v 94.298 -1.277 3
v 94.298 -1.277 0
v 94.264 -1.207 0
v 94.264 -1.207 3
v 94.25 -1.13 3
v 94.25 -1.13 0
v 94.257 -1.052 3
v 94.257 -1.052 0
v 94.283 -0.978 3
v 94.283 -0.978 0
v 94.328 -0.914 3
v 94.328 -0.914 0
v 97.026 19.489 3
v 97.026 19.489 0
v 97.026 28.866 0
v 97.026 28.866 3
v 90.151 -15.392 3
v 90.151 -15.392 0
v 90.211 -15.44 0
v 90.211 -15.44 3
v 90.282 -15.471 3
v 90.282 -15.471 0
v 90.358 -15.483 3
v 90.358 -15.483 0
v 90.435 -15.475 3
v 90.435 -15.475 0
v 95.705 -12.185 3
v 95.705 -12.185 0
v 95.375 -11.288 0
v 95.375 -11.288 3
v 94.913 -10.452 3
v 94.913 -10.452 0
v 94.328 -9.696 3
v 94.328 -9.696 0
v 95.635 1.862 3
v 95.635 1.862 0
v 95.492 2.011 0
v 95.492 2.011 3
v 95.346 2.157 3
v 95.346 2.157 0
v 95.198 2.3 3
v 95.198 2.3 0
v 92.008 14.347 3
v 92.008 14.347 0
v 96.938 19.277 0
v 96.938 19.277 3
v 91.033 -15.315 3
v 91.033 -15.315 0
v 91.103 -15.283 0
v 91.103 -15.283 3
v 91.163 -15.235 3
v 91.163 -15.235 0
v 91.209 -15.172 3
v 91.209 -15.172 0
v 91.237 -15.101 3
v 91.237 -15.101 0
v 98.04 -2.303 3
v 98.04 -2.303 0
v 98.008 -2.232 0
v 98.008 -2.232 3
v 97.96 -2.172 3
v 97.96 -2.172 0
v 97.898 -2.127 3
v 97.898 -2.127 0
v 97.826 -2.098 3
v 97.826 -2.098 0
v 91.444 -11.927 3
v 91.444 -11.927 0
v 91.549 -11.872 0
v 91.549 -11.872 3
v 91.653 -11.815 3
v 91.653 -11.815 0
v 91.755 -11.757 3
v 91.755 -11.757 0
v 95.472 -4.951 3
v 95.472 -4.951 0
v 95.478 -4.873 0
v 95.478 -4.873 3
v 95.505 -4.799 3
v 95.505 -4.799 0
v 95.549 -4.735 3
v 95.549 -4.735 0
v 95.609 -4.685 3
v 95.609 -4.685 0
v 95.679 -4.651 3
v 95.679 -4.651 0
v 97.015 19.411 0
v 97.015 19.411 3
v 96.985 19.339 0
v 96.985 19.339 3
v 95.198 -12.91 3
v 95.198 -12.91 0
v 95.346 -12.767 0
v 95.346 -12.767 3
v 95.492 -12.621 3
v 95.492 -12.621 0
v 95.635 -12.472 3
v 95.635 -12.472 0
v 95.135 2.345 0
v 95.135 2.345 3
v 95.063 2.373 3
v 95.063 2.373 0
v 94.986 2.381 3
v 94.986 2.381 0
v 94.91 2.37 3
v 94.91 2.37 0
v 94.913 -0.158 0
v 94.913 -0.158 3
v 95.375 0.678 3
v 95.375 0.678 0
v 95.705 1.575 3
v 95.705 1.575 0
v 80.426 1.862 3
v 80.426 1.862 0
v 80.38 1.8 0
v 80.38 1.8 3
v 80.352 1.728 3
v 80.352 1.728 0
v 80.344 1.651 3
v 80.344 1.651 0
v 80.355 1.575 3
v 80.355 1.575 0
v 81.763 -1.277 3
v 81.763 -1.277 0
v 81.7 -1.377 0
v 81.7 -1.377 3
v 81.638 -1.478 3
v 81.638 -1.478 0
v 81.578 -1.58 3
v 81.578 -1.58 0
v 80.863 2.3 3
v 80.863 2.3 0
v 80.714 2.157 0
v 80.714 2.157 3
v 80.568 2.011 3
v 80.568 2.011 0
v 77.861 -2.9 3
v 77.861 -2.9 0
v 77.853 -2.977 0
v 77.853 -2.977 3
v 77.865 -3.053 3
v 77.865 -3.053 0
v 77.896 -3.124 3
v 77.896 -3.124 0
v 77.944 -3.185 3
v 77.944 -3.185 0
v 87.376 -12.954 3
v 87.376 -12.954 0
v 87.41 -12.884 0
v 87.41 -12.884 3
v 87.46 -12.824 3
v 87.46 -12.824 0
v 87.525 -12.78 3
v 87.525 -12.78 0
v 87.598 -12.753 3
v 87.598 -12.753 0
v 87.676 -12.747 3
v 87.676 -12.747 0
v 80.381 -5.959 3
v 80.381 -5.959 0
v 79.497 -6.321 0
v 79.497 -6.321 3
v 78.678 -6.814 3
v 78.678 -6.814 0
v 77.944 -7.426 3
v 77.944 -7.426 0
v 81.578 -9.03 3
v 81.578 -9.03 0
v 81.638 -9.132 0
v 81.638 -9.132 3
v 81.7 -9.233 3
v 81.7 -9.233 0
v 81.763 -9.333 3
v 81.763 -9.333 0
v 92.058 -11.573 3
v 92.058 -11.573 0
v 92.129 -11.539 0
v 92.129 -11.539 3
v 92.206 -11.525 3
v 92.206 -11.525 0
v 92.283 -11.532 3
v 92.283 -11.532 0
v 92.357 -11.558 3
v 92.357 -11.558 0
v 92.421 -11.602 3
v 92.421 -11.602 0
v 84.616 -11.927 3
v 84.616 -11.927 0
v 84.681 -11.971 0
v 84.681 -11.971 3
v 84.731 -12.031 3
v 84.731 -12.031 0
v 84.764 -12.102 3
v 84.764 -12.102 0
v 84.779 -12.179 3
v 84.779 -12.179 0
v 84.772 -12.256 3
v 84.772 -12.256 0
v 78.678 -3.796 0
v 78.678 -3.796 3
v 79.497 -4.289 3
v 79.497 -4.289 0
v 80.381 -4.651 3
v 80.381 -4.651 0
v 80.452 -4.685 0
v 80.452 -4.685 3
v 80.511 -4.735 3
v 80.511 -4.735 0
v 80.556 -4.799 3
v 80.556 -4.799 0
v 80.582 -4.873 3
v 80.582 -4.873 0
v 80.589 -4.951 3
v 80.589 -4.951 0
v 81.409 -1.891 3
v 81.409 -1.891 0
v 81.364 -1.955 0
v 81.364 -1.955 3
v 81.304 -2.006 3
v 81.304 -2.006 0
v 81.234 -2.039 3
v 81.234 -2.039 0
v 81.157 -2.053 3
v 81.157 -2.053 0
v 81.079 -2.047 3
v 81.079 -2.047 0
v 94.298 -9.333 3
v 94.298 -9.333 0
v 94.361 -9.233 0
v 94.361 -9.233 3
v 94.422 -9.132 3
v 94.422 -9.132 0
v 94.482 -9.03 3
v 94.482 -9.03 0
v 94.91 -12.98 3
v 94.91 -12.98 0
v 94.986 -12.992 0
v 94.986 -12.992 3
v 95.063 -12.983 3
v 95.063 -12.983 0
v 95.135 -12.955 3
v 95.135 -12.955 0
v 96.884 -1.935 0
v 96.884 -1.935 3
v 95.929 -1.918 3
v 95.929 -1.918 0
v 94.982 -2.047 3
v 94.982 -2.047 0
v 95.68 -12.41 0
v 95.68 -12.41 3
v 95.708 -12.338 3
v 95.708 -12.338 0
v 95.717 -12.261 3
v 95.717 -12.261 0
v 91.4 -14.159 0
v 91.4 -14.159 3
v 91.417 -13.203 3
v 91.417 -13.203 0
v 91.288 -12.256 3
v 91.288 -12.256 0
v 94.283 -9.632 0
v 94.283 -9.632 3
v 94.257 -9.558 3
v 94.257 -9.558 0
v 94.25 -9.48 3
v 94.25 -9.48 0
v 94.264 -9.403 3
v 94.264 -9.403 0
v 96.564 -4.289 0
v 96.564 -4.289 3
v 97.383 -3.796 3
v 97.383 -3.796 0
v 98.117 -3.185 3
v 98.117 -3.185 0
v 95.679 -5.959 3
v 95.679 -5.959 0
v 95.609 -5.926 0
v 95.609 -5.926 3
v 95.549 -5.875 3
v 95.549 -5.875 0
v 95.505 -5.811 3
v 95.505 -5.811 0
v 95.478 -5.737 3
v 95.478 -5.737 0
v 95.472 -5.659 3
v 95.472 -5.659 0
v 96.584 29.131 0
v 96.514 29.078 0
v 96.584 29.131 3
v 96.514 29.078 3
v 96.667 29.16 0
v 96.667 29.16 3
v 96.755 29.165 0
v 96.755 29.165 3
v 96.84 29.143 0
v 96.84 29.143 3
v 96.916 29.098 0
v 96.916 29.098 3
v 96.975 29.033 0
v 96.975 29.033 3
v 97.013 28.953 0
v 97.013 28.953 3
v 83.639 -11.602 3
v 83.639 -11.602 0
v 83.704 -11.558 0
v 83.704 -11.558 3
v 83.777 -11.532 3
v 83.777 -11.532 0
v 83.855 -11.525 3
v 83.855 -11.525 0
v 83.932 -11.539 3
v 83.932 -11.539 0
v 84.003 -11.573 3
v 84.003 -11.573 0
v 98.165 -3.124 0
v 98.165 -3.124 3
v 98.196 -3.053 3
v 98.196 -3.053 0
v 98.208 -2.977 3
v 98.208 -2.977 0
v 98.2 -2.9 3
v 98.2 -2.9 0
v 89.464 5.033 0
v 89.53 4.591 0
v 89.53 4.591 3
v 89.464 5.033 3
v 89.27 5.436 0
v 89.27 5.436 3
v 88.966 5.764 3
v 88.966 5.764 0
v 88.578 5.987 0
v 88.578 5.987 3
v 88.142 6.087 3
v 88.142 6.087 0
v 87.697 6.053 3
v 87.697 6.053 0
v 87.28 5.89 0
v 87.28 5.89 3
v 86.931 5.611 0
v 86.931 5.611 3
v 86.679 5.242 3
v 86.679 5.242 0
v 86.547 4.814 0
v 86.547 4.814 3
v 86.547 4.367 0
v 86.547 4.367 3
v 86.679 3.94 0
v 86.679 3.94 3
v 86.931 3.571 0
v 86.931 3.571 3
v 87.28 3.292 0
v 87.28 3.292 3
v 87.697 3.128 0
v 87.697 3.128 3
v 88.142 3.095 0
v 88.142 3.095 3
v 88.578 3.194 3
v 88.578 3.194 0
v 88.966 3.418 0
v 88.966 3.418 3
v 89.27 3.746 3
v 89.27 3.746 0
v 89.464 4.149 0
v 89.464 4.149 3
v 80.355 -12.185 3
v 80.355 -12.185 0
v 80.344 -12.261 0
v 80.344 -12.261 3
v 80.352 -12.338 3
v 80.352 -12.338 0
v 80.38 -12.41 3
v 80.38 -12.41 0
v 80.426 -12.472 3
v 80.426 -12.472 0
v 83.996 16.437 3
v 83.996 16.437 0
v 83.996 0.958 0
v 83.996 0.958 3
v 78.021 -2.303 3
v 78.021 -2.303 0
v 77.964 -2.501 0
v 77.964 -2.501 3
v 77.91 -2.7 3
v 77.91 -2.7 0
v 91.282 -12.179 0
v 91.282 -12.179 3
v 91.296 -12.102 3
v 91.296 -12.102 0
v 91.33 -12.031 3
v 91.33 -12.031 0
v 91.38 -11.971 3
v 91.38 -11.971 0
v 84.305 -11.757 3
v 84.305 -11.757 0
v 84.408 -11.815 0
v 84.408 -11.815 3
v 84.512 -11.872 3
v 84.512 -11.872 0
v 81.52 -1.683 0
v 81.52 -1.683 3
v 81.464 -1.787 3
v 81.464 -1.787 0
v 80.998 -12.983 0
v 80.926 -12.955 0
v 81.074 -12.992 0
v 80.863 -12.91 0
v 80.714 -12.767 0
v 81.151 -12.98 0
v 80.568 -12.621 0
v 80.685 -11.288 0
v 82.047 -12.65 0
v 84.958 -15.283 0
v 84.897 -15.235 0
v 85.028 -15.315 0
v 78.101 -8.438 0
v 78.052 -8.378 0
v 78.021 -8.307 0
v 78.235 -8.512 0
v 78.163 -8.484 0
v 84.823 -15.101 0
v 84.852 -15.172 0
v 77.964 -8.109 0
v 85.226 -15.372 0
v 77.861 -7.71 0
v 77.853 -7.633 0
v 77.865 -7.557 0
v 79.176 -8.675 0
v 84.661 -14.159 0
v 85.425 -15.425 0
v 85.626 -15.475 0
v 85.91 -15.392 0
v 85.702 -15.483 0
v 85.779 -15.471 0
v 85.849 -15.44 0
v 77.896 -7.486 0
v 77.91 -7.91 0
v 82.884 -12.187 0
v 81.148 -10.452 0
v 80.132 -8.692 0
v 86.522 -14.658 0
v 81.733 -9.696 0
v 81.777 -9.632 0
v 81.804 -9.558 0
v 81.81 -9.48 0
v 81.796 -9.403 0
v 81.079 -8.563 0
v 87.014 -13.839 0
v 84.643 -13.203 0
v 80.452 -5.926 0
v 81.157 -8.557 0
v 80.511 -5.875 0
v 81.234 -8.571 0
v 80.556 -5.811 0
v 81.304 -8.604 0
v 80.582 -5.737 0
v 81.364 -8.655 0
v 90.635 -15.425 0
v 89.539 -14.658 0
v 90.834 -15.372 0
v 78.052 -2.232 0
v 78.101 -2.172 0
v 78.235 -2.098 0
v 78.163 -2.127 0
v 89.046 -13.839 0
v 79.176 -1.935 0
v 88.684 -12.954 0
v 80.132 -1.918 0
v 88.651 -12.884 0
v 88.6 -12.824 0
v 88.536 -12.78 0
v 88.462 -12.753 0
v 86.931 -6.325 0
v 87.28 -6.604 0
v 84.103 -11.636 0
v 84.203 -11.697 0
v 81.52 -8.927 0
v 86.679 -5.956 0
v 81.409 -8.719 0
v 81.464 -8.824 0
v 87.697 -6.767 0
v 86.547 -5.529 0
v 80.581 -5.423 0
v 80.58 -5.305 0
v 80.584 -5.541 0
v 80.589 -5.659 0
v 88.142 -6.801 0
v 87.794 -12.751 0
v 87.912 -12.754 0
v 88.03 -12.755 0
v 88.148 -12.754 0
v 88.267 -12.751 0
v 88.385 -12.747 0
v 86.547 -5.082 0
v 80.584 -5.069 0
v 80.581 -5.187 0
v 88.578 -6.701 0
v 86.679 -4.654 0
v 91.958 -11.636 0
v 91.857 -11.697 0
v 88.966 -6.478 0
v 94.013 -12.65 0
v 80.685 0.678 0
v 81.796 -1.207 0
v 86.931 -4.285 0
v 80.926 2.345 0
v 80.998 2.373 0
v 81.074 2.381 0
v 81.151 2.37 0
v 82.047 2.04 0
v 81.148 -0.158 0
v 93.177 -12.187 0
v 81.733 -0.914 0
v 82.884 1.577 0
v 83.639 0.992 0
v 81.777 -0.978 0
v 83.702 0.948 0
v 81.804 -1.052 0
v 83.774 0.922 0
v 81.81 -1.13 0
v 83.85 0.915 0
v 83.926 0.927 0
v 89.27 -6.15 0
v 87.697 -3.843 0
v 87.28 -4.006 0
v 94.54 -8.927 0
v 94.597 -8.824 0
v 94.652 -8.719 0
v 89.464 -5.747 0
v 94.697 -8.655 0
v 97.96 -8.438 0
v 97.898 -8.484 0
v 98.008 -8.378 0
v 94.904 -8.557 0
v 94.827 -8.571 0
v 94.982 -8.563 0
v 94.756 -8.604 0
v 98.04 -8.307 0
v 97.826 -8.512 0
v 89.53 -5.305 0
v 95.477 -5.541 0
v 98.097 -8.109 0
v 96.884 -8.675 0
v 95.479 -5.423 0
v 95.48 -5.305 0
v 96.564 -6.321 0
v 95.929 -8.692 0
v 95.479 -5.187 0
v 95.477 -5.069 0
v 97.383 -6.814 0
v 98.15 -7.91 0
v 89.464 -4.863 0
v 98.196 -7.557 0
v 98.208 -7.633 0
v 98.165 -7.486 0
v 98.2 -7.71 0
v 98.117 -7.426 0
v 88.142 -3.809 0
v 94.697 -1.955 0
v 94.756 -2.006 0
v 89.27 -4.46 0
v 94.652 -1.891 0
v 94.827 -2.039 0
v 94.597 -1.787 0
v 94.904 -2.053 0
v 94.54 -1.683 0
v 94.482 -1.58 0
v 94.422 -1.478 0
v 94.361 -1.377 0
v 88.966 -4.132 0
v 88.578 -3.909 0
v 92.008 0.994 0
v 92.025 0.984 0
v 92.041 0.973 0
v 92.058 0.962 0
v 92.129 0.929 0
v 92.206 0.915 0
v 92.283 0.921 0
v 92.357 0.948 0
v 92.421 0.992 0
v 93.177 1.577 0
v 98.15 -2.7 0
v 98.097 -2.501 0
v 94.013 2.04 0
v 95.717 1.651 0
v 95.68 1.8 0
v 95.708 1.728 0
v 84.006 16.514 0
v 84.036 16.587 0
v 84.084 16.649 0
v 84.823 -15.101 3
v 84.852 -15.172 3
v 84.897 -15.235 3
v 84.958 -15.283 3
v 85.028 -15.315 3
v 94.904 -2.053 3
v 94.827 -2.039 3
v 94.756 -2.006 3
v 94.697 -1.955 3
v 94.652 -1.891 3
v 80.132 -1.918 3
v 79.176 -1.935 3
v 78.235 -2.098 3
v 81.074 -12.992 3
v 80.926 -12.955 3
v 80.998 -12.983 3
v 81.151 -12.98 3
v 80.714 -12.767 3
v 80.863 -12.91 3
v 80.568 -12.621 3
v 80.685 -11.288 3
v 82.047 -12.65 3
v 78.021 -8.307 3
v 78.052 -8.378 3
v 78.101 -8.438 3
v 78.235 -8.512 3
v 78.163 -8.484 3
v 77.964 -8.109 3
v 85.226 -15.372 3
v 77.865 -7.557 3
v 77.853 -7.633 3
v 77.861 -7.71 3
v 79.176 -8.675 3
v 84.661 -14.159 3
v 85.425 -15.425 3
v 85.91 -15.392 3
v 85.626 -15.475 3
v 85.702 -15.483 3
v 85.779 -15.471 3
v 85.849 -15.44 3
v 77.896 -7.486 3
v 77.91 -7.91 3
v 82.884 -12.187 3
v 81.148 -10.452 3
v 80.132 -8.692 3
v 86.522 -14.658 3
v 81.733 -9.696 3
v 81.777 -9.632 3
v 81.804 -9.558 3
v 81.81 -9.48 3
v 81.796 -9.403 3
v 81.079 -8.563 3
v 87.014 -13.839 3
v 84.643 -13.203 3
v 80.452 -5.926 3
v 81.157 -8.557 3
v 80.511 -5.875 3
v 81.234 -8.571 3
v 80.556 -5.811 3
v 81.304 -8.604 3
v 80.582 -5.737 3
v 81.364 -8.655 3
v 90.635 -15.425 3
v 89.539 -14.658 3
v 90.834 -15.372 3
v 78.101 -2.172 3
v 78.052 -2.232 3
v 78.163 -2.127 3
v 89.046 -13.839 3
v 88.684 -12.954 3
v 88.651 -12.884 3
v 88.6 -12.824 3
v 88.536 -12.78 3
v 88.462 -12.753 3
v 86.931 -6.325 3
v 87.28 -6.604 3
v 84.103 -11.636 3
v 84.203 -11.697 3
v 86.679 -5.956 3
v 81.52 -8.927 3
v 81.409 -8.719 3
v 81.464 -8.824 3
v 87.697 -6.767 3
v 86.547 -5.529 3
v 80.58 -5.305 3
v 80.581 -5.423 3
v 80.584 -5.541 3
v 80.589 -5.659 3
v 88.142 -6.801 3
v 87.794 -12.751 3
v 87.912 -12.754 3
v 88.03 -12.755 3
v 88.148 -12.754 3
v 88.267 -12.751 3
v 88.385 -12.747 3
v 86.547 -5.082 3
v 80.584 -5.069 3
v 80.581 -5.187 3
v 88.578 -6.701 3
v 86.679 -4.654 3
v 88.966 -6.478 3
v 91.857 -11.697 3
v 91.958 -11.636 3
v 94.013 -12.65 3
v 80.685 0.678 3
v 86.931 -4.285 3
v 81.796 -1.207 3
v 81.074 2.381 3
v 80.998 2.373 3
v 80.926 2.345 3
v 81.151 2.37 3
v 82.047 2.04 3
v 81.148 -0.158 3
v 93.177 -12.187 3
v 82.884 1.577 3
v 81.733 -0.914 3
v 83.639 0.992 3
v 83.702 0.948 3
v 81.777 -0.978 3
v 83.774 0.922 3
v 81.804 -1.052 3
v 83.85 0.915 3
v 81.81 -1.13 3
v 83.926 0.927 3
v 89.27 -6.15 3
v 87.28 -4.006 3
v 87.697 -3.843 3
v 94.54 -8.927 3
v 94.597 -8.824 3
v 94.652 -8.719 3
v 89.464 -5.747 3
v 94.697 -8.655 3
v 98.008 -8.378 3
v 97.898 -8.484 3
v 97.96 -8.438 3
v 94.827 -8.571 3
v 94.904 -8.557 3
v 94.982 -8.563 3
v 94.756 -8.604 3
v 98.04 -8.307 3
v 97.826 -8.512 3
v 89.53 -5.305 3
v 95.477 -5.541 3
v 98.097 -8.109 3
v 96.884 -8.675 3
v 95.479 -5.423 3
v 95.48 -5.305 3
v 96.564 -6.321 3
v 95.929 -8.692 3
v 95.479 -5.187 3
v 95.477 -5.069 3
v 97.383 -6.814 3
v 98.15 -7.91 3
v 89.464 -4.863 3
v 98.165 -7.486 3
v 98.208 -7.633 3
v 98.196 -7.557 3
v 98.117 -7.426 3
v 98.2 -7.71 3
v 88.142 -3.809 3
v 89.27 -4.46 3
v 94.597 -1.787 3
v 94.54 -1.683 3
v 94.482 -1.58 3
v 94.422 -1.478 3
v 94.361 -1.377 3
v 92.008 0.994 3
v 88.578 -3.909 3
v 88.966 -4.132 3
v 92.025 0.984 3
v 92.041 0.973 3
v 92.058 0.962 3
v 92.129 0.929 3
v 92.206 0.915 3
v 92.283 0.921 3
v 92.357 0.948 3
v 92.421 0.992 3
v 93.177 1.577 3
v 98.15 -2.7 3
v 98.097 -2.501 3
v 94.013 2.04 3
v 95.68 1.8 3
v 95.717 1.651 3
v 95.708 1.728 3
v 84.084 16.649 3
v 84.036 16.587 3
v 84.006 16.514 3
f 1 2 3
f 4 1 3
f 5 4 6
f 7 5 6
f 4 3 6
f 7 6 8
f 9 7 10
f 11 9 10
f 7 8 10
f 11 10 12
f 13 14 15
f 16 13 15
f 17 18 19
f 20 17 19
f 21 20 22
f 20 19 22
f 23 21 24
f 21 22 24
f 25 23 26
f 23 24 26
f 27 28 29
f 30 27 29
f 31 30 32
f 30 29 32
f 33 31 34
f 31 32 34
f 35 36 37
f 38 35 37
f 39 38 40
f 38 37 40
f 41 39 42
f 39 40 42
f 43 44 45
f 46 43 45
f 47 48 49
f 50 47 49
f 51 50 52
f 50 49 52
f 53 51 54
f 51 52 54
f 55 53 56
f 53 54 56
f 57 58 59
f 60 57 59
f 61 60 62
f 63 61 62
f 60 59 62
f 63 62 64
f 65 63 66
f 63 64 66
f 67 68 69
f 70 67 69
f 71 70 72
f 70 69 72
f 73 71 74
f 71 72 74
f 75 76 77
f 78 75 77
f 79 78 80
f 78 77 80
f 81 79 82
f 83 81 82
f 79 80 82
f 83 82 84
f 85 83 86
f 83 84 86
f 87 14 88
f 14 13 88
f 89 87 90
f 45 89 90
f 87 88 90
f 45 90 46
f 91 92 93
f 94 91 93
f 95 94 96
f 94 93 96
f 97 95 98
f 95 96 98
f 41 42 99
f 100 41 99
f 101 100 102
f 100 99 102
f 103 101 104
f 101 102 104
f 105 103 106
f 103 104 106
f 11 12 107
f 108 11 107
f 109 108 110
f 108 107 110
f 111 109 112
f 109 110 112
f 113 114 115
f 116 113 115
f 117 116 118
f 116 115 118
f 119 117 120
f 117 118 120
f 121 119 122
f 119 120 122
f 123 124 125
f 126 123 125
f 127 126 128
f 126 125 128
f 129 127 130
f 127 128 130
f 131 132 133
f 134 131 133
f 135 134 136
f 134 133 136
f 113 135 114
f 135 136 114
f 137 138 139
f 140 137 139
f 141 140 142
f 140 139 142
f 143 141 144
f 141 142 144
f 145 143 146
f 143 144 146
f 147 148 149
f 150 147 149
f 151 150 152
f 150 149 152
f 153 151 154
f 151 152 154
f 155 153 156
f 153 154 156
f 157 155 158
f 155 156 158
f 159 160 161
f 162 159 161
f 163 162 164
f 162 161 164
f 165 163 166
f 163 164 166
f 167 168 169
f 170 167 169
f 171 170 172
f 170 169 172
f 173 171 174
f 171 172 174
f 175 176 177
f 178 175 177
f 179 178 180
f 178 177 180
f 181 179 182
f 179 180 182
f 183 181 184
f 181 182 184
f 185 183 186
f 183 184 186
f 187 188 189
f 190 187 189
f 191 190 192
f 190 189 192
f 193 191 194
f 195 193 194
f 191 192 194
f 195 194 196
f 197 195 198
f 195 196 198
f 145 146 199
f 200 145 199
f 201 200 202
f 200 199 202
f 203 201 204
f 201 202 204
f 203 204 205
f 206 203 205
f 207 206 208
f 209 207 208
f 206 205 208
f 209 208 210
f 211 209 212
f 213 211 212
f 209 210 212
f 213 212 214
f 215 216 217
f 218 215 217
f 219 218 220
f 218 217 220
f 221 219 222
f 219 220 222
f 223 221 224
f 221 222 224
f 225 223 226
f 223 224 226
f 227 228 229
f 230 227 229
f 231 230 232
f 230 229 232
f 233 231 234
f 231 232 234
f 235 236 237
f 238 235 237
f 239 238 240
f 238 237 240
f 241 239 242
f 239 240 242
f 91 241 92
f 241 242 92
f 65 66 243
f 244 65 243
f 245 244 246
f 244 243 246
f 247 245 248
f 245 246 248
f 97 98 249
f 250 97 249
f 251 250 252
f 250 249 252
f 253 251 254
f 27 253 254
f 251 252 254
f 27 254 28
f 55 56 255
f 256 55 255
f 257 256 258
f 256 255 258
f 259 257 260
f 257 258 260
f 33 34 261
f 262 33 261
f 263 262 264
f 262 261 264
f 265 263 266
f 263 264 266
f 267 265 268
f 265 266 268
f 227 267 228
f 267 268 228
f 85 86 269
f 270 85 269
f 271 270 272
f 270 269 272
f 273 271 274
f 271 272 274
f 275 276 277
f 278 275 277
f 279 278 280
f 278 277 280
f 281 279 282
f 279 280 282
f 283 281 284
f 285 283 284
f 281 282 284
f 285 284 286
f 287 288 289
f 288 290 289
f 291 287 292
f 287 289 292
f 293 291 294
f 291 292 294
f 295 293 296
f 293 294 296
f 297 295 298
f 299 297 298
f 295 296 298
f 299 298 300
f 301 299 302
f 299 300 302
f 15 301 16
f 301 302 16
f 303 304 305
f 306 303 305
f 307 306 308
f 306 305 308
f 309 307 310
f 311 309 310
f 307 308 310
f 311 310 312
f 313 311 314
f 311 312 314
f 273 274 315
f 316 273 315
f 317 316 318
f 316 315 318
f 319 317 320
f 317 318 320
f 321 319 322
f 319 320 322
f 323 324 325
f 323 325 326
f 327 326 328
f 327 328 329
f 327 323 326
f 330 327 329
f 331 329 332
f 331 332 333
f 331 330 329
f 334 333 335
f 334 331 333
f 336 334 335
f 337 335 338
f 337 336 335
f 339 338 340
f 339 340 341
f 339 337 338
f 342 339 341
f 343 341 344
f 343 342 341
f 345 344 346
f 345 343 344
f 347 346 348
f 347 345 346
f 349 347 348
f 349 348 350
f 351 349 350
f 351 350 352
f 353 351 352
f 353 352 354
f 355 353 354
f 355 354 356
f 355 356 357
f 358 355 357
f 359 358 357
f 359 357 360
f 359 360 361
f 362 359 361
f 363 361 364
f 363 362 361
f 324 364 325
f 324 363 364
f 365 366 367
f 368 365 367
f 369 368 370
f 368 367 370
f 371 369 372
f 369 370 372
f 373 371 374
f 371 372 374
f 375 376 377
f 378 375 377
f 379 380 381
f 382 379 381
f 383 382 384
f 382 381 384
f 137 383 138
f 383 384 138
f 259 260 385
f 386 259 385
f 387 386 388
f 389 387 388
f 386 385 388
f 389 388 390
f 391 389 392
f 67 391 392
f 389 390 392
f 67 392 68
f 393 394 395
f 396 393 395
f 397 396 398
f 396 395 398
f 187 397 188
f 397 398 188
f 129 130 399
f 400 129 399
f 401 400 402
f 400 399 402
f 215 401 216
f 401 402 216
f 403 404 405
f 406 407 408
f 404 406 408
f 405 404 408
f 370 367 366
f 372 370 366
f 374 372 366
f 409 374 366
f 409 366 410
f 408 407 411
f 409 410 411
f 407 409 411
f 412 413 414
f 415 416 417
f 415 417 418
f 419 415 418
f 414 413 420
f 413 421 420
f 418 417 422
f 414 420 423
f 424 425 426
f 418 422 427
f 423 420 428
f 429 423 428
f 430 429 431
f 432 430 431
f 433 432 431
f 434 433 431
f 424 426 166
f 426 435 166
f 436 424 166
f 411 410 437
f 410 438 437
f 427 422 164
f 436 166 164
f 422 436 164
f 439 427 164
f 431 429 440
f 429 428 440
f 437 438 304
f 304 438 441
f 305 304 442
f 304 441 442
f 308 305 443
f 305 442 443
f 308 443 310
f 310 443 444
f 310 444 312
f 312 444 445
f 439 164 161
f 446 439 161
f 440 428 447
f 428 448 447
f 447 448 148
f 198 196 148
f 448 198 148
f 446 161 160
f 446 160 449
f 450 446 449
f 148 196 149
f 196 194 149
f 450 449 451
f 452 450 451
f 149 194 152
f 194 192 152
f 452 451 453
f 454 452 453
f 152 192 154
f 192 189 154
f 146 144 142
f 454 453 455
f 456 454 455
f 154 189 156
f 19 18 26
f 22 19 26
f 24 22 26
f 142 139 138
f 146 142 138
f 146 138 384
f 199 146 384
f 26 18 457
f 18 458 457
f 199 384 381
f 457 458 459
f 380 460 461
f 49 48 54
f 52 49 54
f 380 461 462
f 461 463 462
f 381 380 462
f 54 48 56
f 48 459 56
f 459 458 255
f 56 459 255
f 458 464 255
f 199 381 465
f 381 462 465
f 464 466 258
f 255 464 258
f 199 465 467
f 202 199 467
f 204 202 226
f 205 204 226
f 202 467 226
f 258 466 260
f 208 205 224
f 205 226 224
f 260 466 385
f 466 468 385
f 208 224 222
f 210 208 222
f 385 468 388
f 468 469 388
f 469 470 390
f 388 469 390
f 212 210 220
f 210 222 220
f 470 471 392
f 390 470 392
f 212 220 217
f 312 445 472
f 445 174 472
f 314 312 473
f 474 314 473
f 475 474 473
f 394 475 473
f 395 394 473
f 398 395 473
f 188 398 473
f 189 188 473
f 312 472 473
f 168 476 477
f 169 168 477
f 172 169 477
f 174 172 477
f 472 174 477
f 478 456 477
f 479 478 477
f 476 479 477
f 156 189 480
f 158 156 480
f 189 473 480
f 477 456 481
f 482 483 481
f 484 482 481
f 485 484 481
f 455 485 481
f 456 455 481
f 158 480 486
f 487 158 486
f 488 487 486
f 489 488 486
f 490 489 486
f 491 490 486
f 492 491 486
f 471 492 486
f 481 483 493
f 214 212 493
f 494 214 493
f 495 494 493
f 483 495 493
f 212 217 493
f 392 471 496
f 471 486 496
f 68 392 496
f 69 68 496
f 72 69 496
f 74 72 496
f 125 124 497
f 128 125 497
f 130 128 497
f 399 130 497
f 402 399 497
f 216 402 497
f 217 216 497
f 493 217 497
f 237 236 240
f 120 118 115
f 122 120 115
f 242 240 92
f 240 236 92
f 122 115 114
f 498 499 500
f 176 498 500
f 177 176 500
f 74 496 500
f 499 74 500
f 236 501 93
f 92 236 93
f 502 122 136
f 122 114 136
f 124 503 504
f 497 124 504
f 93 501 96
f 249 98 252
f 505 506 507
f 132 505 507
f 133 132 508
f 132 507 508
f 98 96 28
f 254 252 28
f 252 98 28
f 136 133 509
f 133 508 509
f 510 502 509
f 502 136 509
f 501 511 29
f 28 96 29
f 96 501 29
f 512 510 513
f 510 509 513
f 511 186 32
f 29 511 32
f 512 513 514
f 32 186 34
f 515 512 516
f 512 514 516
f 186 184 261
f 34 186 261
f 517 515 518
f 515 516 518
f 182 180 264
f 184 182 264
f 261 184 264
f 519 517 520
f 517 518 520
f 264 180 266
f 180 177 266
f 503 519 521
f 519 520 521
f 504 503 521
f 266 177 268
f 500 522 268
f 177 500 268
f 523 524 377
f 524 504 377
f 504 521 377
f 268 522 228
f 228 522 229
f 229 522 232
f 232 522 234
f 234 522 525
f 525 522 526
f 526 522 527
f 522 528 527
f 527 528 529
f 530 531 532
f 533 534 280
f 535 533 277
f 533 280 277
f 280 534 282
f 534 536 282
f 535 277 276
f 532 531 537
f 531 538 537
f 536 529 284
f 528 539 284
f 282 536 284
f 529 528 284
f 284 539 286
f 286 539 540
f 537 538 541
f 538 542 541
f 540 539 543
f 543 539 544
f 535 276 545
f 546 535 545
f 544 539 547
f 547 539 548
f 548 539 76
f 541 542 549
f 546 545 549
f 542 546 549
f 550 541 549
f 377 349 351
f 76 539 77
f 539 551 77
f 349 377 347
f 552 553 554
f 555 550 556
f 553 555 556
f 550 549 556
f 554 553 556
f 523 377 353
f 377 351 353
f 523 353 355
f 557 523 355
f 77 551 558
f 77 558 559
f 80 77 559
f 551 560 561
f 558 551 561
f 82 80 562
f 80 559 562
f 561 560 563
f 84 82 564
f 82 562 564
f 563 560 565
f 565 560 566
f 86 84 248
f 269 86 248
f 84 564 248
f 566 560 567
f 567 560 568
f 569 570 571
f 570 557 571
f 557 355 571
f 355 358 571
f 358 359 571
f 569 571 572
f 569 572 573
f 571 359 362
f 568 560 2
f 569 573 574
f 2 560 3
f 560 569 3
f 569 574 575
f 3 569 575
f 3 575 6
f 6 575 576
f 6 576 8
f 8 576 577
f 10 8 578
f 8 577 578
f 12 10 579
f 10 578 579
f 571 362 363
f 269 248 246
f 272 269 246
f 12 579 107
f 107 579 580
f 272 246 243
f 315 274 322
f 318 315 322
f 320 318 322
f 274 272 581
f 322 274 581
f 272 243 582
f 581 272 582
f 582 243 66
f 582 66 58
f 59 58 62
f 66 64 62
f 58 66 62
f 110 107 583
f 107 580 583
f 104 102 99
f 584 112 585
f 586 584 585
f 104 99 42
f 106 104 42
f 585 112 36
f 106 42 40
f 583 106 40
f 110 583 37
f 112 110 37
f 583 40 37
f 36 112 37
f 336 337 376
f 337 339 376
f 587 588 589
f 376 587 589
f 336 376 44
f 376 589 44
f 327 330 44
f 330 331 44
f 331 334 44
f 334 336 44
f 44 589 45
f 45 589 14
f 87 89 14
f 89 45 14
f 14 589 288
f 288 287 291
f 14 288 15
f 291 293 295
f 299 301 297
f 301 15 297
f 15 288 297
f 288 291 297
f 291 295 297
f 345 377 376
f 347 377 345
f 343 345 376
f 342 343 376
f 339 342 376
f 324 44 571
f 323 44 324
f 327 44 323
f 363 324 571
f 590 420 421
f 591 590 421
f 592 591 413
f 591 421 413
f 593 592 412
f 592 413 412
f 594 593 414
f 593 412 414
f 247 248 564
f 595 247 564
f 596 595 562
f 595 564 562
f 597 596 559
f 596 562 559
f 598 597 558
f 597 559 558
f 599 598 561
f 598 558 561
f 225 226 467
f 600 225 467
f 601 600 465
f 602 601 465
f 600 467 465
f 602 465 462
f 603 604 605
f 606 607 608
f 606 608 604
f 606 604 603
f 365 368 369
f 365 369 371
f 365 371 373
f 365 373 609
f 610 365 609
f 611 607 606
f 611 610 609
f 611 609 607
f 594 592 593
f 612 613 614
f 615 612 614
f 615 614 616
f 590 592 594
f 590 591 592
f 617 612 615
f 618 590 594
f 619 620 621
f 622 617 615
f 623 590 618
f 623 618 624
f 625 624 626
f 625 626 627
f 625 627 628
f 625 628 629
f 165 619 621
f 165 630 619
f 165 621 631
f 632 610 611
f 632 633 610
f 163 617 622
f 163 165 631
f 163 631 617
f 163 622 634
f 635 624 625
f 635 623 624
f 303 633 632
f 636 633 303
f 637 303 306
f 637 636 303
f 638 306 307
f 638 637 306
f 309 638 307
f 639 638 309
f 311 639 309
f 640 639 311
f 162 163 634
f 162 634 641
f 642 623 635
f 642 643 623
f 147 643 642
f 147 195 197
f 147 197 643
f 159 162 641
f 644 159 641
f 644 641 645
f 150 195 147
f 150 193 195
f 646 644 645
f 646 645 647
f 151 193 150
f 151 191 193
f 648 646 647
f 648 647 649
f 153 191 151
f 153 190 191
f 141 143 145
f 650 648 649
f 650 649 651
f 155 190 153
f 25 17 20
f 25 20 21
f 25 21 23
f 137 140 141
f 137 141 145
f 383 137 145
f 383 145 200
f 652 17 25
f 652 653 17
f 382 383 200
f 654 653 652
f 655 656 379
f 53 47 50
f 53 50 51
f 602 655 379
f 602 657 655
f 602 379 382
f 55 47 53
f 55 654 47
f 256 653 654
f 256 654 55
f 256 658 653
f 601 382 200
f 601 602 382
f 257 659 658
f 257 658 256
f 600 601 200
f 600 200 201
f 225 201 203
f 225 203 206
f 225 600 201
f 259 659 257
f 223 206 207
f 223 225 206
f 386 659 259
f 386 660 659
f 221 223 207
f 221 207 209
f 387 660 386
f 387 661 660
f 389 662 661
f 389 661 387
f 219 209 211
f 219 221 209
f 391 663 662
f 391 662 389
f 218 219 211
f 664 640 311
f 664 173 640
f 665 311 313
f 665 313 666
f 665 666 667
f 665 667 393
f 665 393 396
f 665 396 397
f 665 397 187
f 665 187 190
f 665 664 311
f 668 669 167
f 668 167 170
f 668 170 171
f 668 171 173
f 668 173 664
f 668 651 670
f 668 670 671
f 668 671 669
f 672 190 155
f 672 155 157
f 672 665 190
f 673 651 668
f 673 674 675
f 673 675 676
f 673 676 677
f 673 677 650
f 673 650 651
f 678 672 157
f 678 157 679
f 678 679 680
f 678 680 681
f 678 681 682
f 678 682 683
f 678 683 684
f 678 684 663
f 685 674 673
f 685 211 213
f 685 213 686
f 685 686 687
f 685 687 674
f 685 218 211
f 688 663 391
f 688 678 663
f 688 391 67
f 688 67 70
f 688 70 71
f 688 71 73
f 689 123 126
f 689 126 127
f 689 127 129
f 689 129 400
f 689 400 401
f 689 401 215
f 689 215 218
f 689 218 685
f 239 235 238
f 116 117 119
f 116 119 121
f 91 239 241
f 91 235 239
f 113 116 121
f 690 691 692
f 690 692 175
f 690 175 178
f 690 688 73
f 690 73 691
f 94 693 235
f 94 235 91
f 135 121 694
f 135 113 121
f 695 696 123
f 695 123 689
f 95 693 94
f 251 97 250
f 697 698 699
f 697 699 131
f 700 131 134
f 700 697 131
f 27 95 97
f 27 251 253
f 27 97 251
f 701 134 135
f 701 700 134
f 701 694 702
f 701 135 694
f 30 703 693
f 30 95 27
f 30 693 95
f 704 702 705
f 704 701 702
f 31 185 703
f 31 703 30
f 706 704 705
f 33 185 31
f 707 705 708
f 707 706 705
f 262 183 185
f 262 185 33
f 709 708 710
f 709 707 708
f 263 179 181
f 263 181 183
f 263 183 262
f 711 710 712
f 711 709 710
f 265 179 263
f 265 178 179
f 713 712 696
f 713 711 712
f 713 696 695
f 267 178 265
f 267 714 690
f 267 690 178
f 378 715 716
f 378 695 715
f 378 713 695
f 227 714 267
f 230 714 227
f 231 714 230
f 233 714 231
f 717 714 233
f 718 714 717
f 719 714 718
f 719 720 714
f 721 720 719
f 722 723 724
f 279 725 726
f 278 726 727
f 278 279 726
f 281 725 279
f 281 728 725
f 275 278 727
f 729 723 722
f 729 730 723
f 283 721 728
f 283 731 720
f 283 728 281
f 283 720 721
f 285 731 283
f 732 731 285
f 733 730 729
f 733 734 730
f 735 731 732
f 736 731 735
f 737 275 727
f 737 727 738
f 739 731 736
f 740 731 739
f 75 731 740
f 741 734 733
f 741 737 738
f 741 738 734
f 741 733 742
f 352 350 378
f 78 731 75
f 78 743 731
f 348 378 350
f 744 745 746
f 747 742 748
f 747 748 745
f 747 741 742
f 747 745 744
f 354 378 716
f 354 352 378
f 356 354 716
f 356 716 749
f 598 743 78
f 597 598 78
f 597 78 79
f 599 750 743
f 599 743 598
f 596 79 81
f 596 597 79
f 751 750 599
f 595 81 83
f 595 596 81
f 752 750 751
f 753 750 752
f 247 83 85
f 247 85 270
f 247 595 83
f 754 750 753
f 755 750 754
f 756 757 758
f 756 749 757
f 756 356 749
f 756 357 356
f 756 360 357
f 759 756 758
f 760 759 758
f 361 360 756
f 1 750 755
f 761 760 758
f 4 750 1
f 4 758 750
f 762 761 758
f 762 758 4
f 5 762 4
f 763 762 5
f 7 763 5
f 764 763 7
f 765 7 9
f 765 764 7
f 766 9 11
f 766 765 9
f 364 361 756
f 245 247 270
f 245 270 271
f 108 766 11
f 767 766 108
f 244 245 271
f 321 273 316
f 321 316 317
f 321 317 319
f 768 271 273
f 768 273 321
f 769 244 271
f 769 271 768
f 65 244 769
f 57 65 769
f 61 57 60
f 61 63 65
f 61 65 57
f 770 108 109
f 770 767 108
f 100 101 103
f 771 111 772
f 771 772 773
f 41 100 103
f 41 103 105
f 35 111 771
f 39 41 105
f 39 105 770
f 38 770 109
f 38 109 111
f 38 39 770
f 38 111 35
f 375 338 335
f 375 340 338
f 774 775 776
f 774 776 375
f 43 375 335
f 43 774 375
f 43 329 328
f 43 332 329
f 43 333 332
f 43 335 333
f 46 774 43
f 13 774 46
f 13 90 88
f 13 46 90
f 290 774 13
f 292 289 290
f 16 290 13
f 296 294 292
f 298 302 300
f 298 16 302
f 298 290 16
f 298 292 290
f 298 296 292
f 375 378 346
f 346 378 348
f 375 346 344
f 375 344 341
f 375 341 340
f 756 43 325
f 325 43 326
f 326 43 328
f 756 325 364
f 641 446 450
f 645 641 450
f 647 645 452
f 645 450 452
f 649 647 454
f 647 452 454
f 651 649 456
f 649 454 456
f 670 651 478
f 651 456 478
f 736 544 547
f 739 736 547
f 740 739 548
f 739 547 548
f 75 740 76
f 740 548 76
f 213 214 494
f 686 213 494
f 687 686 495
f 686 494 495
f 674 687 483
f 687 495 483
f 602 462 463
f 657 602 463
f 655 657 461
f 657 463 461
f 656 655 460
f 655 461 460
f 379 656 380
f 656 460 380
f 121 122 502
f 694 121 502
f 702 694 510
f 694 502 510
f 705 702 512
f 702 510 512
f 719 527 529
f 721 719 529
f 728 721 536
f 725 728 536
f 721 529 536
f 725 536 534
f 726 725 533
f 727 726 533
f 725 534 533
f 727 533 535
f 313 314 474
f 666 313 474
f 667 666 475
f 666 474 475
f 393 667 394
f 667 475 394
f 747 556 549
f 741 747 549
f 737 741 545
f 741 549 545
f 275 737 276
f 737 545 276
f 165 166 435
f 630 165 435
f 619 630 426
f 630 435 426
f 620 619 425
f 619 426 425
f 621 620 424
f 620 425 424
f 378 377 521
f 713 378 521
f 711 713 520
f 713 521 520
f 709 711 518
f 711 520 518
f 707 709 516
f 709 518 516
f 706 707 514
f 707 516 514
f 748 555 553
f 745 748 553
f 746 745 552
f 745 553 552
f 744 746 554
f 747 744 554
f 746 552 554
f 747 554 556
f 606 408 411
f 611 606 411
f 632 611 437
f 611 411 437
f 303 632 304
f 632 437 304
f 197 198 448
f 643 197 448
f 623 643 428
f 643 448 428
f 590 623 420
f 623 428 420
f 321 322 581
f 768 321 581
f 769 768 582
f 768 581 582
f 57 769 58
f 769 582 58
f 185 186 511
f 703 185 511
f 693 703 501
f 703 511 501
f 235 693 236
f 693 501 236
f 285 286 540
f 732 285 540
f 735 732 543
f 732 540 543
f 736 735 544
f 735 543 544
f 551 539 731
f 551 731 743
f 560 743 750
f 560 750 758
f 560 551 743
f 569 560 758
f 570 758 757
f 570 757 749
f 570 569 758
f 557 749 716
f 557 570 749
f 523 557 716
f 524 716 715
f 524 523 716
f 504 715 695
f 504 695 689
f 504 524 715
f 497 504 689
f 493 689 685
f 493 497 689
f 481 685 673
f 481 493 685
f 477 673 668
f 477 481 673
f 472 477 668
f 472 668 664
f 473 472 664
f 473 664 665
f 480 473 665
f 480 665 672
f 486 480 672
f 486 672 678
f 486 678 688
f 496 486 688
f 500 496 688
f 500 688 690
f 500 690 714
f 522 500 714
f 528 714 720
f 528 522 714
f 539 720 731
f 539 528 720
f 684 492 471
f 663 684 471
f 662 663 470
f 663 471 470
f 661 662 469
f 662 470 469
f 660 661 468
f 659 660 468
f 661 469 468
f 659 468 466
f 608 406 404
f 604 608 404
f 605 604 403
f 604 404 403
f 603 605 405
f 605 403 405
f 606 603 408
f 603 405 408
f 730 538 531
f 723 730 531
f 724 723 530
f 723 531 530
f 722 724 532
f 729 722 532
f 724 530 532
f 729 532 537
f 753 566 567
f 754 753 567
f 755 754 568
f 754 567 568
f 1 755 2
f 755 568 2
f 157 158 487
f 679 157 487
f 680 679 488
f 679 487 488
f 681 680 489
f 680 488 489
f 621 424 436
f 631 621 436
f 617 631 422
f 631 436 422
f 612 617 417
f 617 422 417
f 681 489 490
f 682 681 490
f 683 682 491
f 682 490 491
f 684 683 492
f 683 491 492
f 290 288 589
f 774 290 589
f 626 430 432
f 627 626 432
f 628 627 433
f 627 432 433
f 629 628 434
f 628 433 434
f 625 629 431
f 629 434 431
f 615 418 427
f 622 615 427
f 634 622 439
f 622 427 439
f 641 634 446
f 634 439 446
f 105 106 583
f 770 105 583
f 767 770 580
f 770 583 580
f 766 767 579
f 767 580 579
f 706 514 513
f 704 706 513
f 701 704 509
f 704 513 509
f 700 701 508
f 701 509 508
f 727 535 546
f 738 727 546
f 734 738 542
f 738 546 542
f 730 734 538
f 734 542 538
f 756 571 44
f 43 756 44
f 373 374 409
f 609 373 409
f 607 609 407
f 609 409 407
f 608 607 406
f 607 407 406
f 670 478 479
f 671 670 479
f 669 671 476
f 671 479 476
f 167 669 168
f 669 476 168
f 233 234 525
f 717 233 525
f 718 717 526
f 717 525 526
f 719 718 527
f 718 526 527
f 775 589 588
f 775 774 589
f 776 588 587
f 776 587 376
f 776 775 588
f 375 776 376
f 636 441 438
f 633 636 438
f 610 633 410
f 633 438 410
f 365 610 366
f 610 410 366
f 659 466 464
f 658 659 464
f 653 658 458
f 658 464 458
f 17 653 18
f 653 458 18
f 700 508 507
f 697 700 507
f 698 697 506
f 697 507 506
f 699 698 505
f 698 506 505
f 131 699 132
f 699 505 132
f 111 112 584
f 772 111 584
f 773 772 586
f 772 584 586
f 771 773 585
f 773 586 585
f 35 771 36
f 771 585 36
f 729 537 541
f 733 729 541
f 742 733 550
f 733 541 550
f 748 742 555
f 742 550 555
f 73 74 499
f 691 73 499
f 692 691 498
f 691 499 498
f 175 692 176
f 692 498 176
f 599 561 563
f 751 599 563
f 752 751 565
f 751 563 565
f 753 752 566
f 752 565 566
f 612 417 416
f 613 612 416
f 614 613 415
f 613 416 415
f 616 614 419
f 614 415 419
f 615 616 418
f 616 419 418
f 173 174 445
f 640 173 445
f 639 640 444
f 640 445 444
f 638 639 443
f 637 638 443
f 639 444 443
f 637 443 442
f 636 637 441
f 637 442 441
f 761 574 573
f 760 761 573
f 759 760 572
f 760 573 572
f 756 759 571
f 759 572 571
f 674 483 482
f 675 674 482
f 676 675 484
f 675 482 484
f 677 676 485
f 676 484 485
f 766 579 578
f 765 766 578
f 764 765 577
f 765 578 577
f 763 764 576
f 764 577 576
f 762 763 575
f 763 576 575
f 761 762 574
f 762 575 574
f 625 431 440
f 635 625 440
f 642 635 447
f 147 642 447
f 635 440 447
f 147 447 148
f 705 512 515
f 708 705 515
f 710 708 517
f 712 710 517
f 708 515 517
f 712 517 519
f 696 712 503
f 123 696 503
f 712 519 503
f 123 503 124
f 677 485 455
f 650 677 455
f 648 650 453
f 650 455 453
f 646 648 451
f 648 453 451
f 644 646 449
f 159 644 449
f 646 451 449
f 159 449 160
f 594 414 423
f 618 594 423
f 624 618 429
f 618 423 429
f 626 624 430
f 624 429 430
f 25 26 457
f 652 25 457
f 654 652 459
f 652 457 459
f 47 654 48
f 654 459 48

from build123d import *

# Parameters (mm, degrees)
ESQUISSE18_R        = 1.5
BOSS_EXTRU_18_DEPTH = 3
CONG_1_R            = 0.3


with BuildPart() as part:
    # Esquisse18 → Boss.-Extru.18 (new body)
    with BuildSketch(Plane.XY):
        with BuildLine():
            Line((97.025632531, 29.590316063), (83.99617235, 16.560855882))
            Line((83.99617235, 16.560855882), (83.99617235, 0.958265781))
            ThreePointArc((83.99617235, 0.958265781), (83.812104956, 0.91607214), (83.639294573, 0.992214643))
            ThreePointArc((83.639294573, 0.992214643), (82.474359337, 1.824587373), (81.150565301, 2.370011808))
            ThreePointArc((81.150565301, 2.370011808), (80.997528298, 2.372778276), (80.863045123, 2.29968756))
            ThreePointArc((80.863045123, 2.29968756), (80.641045132, 2.084165463), (80.425523035, 1.862165472))
            ThreePointArc((80.425523035, 1.862165472), (80.352432318, 1.727682296), (80.355198786, 1.574645294))
            ThreePointArc((80.355198786, 1.574645294), (80.900623221, 0.250851257), (81.732995951, -0.914083979))
            ThreePointArc((81.732995951, -0.914083979), (81.809478339, -1.090727988), (81.76286699, -1.277489987))
            ThreePointArc((81.76286699, -1.277489987), (81.668844739, -1.427698297), (81.578421737, -1.580100401))
            ThreePointArc((81.578421737, -1.580100401), (81.491649145, -1.734610069), (81.408576058, -1.891139882))
            ThreePointArc((81.408576058, -1.891139882), (81.270141097, -2.024887494), (81.078921703, -2.046973808))
            ThreePointArc((81.078921703, -2.046973808), (79.65387183, -1.908585496), (78.234720348, -2.098131098))
            ThreePointArc((78.234720348, -2.098131098), (78.100803182, -2.172253768), (78.020882694, -2.302793773))
            ThreePointArc((78.020882694, -2.302793773), (77.93638611, -2.600441379), (77.860738495, -2.90046006))
            ThreePointArc((77.860738495, -2.90046006), (77.864681666, -3.053471264), (77.943595998, -3.184621962))
            ThreePointArc((77.943595998, -3.184621962), (79.077844433, -4.058349009), (80.38116798, -4.651026153))
            ThreePointArc((80.38116798, -4.651026153), (80.535725676, -4.765763159), (80.588740063, -4.950809468))
            ThreePointArc((80.588740063, -4.950809468), (80.58241856, -5.127904807), (80.580310995, -5.305100401))
            ThreePointArc((80.580310995, -5.305100401), (80.58241856, -5.482295995), (80.588740063, -5.659391333))
            ThreePointArc((80.588740063, -5.659391333), (80.535725676, -5.844437642), (80.38116798, -5.959174648))
            ThreePointArc((80.38116798, -5.959174648), (79.077844433, -6.551851792), (77.943595998, -7.425578839))
            ThreePointArc((77.943595998, -7.425578839), (77.864681666, -7.556729537), (77.860738495, -7.709740741))
            ThreePointArc((77.860738495, -7.709740741), (77.93638611, -8.009759422), (78.020882694, -8.307407028))
            ThreePointArc((78.020882694, -8.307407028), (78.100803182, -8.437947034), (78.234720348, -8.512069703))
            ThreePointArc((78.234720348, -8.512069703), (79.65387183, -8.701615305), (81.078921703, -8.563226993))
            ThreePointArc((81.078921703, -8.563226993), (81.270141097, -8.585313307), (81.408576058, -8.719060919))
            ThreePointArc((81.408576058, -8.719060919), (81.491649145, -8.875590732), (81.578421737, -9.030100401))
            ThreePointArc((81.578421737, -9.030100401), (81.668844739, -9.182502504), (81.76286699, -9.332710814))
            ThreePointArc((81.76286699, -9.332710814), (81.809478339, -9.519472813), (81.732995951, -9.696116822))
            ThreePointArc((81.732995951, -9.696116822), (80.900623221, -10.861052059), (80.355198786, -12.184846095))
            ThreePointArc((80.355198786, -12.184846095), (80.352432318, -12.337883097), (80.425523035, -12.472366273))
            ThreePointArc((80.425523035, -12.472366273), (80.641045132, -12.694366264), (80.863045123, -12.909888361))
            ThreePointArc((80.863045123, -12.909888361), (80.997528298, -12.982979077), (81.150565301, -12.98021261))
            ThreePointArc((81.150565301, -12.98021261), (82.474359337, -12.434788174), (83.639294573, -11.602415444))
            ThreePointArc((83.639294573, -11.602415444), (83.815938583, -11.525933057), (84.002700581, -11.572544405))
            ThreePointArc((84.002700581, -11.572544405), (84.152908892, -11.666566657), (84.305310995, -11.756989659))
            ThreePointArc((84.305310995, -11.756989659), (84.459820663, -11.843762251), (84.616350477, -11.926835338))
            ThreePointArc((84.616350477, -11.926835338), (84.750098088, -12.065270299), (84.772184402, -12.256489692))
            ThreePointArc((84.772184402, -12.256489692), (84.633796091, -13.681539565), (84.823341693, -15.100691048))
            ThreePointArc((84.823341693, -15.100691048), (84.897464362, -15.234608214), (85.028004367, -15.314528702))
            ThreePointArc((85.028004367, -15.314528702), (85.325651974, -15.399025285), (85.625670654, -15.474672901))
            ThreePointArc((85.625670654, -15.474672901), (85.778681859, -15.47072973), (85.909832557, -15.391815398))
            ThreePointArc((85.909832557, -15.391815398), (86.783559604, -14.257566963), (87.376236747, -12.954243415))
            ThreePointArc((87.376236747, -12.954243415), (87.490973753, -12.79968572), (87.676020063, -12.746671333))
            ThreePointArc((87.676020063, -12.746671333), (87.853115401, -12.752992835), (88.030310995, -12.755100401))
            ThreePointArc((88.030310995, -12.755100401), (88.207506589, -12.752992835), (88.384601928, -12.746671333))
            ThreePointArc((88.384601928, -12.746671333), (88.569648237, -12.79968572), (88.684385243, -12.954243415))
            ThreePointArc((88.684385243, -12.954243415), (89.277062386, -14.257566963), (90.150789434, -15.391815398))
            ThreePointArc((90.150789434, -15.391815398), (90.281940131, -15.47072973), (90.434951336, -15.474672901))
            ThreePointArc((90.434951336, -15.474672901), (90.734970016, -15.399025285), (91.032617623, -15.314528702))
            ThreePointArc((91.032617623, -15.314528702), (91.163157628, -15.234608214), (91.237280298, -15.100691048))
            ThreePointArc((91.237280298, -15.100691048), (91.426825899, -13.681539565), (91.288437588, -12.256489692))
            ThreePointArc((91.288437588, -12.256489692), (91.310523902, -12.065270299), (91.444271513, -11.926835338))
            ThreePointArc((91.444271513, -11.926835338), (91.600801327, -11.843762251), (91.755310995, -11.756989659))
            ThreePointArc((91.755310995, -11.756989659), (91.907713098, -11.666566657), (92.057921409, -11.572544405))
            ThreePointArc((92.057921409, -11.572544405), (92.244683407, -11.525933057), (92.421327417, -11.602415444))
            ThreePointArc((92.421327417, -11.602415444), (93.586262653, -12.434788174), (94.91005669, -12.98021261))
            ThreePointArc((94.91005669, -12.98021261), (95.063093692, -12.982979077), (95.197576867, -12.909888361))
            ThreePointArc((95.197576867, -12.909888361), (95.419576859, -12.694366264), (95.635098955, -12.472366273))
            ThreePointArc((95.635098955, -12.472366273), (95.708189672, -12.337883097), (95.705423204, -12.184846095))
            ThreePointArc((95.705423204, -12.184846095), (95.159998769, -10.861052059), (94.327626039, -9.696116822))
            ThreePointArc((94.327626039, -9.696116822), (94.251143651, -9.519472813), (94.297755, -9.332710814))
            ThreePointArc((94.297755, -9.332710814), (94.391777251, -9.182502504), (94.482200253, -9.030100401))
            ThreePointArc((94.482200253, -9.030100401), (94.568972845, -8.875590732), (94.652045932, -8.719060919))
            ThreePointArc((94.652045932, -8.719060919), (94.790480893, -8.585313307), (94.981700287, -8.563226993))
            ThreePointArc((94.981700287, -8.563226993), (96.40675016, -8.701615305), (97.825901643, -8.512069703))
            ThreePointArc((97.825901643, -8.512069703), (97.959818808, -8.437947034), (98.039739296, -8.307407028))
            ThreePointArc((98.039739296, -8.307407028), (98.12423588, -8.009759422), (98.199883495, -7.709740741))
            ThreePointArc((98.199883495, -7.709740741), (98.195940325, -7.556729537), (98.117025992, -7.425578839))
            ThreePointArc((98.117025992, -7.425578839), (96.982777557, -6.551851792), (95.67945401, -5.959174648))
            ThreePointArc((95.67945401, -5.959174648), (95.524896314, -5.844437642), (95.471881927, -5.659391333))
            ThreePointArc((95.471881927, -5.659391333), (95.47820343, -5.482295994), (95.480310995, -5.305100401))
            ThreePointArc((95.480310995, -5.305100401), (95.47820343, -5.127904807), (95.471881927, -4.950809468))
            ThreePointArc((95.471881927, -4.950809468), (95.524896314, -4.765763159), (95.67945401, -4.651026153))
            ThreePointArc((95.67945401, -4.651026153), (96.982777557, -4.058349009), (98.117025992, -3.184621962))
            ThreePointArc((98.117025992, -3.184621962), (98.195940325, -3.053471264), (98.199883495, -2.90046006))
            ThreePointArc((98.199883495, -2.90046006), (98.12423588, -2.600441379), (98.039739296, -2.302793773))
            ThreePointArc((98.039739296, -2.302793773), (97.959818808, -2.172253768), (97.825901643, -2.098131098))
            ThreePointArc((97.825901643, -2.098131098), (96.40675016, -1.908585496), (94.981700287, -2.046973808))
            ThreePointArc((94.981700287, -2.046973808), (94.790480893, -2.024887494), (94.652045932, -1.891139882))
            ThreePointArc((94.652045932, -1.891139882), (94.568972845, -1.734610069), (94.482200253, -1.580100401))
            ThreePointArc((94.482200253, -1.580100401), (94.391777251, -1.427698297), (94.297755, -1.277489987))
            ThreePointArc((94.297755, -1.277489987), (94.251143651, -1.090727988), (94.327626039, -0.914083979))
            ThreePointArc((94.327626039, -0.914083979), (95.159998769, 0.250851257), (95.705423204, 1.574645294))
            ThreePointArc((95.705423204, 1.574645294), (95.708189672, 1.727682296), (95.635098955, 1.862165472))
            ThreePointArc((95.635098955, 1.862165472), (95.419576859, 2.084165463), (95.197576867, 2.29968756))
            ThreePointArc((95.197576867, 2.29968756), (95.063093692, 2.372778276), (94.91005669, 2.370011808))
            ThreePointArc((94.91005669, 2.370011808), (93.586262653, 1.824587373), (92.421327417, 0.992214643))
            ThreePointArc((92.421327417, 0.992214643), (92.244683407, 0.915732256), (92.057921409, 0.962343604))
            ThreePointArc((92.057921409, 0.962343604), (92.032989683, 0.978295443), (92.007994778, 0.994148104))
            Line((92.007994778, 0.994148104), (92.007994778, 14.347176993))
            Line((92.007994778, 14.347176993), (97.025632531, 19.364814746))
            Line((97.025632531, 19.364814746), (97.025632531, 29.590316063))
        make_face()
        with Locations((88.030310995, -5.305100401)):
            Circle(ESQUISSE18_R, mode=Mode.SUBTRACT)
        with Locations((88.030310995, 4.590763304)):
            Circle(ESQUISSE18_R, mode=Mode.SUBTRACT)
    extrude(amount=BOSS_EXTRU_18_DEPTH)

    # Congé1
    cong_1_edges = [part.edges().sort_by_distance(p)[0] for p in [
        (83.99617235, 16.560855882, 1.5),
        (97.025632531, 29.590316063, 1.5),
        (97.025632531, 19.364814746, 1.5),
    ]]
    fillet(cong_1_edges, radius=CONG_1_R)


solid = part.part
